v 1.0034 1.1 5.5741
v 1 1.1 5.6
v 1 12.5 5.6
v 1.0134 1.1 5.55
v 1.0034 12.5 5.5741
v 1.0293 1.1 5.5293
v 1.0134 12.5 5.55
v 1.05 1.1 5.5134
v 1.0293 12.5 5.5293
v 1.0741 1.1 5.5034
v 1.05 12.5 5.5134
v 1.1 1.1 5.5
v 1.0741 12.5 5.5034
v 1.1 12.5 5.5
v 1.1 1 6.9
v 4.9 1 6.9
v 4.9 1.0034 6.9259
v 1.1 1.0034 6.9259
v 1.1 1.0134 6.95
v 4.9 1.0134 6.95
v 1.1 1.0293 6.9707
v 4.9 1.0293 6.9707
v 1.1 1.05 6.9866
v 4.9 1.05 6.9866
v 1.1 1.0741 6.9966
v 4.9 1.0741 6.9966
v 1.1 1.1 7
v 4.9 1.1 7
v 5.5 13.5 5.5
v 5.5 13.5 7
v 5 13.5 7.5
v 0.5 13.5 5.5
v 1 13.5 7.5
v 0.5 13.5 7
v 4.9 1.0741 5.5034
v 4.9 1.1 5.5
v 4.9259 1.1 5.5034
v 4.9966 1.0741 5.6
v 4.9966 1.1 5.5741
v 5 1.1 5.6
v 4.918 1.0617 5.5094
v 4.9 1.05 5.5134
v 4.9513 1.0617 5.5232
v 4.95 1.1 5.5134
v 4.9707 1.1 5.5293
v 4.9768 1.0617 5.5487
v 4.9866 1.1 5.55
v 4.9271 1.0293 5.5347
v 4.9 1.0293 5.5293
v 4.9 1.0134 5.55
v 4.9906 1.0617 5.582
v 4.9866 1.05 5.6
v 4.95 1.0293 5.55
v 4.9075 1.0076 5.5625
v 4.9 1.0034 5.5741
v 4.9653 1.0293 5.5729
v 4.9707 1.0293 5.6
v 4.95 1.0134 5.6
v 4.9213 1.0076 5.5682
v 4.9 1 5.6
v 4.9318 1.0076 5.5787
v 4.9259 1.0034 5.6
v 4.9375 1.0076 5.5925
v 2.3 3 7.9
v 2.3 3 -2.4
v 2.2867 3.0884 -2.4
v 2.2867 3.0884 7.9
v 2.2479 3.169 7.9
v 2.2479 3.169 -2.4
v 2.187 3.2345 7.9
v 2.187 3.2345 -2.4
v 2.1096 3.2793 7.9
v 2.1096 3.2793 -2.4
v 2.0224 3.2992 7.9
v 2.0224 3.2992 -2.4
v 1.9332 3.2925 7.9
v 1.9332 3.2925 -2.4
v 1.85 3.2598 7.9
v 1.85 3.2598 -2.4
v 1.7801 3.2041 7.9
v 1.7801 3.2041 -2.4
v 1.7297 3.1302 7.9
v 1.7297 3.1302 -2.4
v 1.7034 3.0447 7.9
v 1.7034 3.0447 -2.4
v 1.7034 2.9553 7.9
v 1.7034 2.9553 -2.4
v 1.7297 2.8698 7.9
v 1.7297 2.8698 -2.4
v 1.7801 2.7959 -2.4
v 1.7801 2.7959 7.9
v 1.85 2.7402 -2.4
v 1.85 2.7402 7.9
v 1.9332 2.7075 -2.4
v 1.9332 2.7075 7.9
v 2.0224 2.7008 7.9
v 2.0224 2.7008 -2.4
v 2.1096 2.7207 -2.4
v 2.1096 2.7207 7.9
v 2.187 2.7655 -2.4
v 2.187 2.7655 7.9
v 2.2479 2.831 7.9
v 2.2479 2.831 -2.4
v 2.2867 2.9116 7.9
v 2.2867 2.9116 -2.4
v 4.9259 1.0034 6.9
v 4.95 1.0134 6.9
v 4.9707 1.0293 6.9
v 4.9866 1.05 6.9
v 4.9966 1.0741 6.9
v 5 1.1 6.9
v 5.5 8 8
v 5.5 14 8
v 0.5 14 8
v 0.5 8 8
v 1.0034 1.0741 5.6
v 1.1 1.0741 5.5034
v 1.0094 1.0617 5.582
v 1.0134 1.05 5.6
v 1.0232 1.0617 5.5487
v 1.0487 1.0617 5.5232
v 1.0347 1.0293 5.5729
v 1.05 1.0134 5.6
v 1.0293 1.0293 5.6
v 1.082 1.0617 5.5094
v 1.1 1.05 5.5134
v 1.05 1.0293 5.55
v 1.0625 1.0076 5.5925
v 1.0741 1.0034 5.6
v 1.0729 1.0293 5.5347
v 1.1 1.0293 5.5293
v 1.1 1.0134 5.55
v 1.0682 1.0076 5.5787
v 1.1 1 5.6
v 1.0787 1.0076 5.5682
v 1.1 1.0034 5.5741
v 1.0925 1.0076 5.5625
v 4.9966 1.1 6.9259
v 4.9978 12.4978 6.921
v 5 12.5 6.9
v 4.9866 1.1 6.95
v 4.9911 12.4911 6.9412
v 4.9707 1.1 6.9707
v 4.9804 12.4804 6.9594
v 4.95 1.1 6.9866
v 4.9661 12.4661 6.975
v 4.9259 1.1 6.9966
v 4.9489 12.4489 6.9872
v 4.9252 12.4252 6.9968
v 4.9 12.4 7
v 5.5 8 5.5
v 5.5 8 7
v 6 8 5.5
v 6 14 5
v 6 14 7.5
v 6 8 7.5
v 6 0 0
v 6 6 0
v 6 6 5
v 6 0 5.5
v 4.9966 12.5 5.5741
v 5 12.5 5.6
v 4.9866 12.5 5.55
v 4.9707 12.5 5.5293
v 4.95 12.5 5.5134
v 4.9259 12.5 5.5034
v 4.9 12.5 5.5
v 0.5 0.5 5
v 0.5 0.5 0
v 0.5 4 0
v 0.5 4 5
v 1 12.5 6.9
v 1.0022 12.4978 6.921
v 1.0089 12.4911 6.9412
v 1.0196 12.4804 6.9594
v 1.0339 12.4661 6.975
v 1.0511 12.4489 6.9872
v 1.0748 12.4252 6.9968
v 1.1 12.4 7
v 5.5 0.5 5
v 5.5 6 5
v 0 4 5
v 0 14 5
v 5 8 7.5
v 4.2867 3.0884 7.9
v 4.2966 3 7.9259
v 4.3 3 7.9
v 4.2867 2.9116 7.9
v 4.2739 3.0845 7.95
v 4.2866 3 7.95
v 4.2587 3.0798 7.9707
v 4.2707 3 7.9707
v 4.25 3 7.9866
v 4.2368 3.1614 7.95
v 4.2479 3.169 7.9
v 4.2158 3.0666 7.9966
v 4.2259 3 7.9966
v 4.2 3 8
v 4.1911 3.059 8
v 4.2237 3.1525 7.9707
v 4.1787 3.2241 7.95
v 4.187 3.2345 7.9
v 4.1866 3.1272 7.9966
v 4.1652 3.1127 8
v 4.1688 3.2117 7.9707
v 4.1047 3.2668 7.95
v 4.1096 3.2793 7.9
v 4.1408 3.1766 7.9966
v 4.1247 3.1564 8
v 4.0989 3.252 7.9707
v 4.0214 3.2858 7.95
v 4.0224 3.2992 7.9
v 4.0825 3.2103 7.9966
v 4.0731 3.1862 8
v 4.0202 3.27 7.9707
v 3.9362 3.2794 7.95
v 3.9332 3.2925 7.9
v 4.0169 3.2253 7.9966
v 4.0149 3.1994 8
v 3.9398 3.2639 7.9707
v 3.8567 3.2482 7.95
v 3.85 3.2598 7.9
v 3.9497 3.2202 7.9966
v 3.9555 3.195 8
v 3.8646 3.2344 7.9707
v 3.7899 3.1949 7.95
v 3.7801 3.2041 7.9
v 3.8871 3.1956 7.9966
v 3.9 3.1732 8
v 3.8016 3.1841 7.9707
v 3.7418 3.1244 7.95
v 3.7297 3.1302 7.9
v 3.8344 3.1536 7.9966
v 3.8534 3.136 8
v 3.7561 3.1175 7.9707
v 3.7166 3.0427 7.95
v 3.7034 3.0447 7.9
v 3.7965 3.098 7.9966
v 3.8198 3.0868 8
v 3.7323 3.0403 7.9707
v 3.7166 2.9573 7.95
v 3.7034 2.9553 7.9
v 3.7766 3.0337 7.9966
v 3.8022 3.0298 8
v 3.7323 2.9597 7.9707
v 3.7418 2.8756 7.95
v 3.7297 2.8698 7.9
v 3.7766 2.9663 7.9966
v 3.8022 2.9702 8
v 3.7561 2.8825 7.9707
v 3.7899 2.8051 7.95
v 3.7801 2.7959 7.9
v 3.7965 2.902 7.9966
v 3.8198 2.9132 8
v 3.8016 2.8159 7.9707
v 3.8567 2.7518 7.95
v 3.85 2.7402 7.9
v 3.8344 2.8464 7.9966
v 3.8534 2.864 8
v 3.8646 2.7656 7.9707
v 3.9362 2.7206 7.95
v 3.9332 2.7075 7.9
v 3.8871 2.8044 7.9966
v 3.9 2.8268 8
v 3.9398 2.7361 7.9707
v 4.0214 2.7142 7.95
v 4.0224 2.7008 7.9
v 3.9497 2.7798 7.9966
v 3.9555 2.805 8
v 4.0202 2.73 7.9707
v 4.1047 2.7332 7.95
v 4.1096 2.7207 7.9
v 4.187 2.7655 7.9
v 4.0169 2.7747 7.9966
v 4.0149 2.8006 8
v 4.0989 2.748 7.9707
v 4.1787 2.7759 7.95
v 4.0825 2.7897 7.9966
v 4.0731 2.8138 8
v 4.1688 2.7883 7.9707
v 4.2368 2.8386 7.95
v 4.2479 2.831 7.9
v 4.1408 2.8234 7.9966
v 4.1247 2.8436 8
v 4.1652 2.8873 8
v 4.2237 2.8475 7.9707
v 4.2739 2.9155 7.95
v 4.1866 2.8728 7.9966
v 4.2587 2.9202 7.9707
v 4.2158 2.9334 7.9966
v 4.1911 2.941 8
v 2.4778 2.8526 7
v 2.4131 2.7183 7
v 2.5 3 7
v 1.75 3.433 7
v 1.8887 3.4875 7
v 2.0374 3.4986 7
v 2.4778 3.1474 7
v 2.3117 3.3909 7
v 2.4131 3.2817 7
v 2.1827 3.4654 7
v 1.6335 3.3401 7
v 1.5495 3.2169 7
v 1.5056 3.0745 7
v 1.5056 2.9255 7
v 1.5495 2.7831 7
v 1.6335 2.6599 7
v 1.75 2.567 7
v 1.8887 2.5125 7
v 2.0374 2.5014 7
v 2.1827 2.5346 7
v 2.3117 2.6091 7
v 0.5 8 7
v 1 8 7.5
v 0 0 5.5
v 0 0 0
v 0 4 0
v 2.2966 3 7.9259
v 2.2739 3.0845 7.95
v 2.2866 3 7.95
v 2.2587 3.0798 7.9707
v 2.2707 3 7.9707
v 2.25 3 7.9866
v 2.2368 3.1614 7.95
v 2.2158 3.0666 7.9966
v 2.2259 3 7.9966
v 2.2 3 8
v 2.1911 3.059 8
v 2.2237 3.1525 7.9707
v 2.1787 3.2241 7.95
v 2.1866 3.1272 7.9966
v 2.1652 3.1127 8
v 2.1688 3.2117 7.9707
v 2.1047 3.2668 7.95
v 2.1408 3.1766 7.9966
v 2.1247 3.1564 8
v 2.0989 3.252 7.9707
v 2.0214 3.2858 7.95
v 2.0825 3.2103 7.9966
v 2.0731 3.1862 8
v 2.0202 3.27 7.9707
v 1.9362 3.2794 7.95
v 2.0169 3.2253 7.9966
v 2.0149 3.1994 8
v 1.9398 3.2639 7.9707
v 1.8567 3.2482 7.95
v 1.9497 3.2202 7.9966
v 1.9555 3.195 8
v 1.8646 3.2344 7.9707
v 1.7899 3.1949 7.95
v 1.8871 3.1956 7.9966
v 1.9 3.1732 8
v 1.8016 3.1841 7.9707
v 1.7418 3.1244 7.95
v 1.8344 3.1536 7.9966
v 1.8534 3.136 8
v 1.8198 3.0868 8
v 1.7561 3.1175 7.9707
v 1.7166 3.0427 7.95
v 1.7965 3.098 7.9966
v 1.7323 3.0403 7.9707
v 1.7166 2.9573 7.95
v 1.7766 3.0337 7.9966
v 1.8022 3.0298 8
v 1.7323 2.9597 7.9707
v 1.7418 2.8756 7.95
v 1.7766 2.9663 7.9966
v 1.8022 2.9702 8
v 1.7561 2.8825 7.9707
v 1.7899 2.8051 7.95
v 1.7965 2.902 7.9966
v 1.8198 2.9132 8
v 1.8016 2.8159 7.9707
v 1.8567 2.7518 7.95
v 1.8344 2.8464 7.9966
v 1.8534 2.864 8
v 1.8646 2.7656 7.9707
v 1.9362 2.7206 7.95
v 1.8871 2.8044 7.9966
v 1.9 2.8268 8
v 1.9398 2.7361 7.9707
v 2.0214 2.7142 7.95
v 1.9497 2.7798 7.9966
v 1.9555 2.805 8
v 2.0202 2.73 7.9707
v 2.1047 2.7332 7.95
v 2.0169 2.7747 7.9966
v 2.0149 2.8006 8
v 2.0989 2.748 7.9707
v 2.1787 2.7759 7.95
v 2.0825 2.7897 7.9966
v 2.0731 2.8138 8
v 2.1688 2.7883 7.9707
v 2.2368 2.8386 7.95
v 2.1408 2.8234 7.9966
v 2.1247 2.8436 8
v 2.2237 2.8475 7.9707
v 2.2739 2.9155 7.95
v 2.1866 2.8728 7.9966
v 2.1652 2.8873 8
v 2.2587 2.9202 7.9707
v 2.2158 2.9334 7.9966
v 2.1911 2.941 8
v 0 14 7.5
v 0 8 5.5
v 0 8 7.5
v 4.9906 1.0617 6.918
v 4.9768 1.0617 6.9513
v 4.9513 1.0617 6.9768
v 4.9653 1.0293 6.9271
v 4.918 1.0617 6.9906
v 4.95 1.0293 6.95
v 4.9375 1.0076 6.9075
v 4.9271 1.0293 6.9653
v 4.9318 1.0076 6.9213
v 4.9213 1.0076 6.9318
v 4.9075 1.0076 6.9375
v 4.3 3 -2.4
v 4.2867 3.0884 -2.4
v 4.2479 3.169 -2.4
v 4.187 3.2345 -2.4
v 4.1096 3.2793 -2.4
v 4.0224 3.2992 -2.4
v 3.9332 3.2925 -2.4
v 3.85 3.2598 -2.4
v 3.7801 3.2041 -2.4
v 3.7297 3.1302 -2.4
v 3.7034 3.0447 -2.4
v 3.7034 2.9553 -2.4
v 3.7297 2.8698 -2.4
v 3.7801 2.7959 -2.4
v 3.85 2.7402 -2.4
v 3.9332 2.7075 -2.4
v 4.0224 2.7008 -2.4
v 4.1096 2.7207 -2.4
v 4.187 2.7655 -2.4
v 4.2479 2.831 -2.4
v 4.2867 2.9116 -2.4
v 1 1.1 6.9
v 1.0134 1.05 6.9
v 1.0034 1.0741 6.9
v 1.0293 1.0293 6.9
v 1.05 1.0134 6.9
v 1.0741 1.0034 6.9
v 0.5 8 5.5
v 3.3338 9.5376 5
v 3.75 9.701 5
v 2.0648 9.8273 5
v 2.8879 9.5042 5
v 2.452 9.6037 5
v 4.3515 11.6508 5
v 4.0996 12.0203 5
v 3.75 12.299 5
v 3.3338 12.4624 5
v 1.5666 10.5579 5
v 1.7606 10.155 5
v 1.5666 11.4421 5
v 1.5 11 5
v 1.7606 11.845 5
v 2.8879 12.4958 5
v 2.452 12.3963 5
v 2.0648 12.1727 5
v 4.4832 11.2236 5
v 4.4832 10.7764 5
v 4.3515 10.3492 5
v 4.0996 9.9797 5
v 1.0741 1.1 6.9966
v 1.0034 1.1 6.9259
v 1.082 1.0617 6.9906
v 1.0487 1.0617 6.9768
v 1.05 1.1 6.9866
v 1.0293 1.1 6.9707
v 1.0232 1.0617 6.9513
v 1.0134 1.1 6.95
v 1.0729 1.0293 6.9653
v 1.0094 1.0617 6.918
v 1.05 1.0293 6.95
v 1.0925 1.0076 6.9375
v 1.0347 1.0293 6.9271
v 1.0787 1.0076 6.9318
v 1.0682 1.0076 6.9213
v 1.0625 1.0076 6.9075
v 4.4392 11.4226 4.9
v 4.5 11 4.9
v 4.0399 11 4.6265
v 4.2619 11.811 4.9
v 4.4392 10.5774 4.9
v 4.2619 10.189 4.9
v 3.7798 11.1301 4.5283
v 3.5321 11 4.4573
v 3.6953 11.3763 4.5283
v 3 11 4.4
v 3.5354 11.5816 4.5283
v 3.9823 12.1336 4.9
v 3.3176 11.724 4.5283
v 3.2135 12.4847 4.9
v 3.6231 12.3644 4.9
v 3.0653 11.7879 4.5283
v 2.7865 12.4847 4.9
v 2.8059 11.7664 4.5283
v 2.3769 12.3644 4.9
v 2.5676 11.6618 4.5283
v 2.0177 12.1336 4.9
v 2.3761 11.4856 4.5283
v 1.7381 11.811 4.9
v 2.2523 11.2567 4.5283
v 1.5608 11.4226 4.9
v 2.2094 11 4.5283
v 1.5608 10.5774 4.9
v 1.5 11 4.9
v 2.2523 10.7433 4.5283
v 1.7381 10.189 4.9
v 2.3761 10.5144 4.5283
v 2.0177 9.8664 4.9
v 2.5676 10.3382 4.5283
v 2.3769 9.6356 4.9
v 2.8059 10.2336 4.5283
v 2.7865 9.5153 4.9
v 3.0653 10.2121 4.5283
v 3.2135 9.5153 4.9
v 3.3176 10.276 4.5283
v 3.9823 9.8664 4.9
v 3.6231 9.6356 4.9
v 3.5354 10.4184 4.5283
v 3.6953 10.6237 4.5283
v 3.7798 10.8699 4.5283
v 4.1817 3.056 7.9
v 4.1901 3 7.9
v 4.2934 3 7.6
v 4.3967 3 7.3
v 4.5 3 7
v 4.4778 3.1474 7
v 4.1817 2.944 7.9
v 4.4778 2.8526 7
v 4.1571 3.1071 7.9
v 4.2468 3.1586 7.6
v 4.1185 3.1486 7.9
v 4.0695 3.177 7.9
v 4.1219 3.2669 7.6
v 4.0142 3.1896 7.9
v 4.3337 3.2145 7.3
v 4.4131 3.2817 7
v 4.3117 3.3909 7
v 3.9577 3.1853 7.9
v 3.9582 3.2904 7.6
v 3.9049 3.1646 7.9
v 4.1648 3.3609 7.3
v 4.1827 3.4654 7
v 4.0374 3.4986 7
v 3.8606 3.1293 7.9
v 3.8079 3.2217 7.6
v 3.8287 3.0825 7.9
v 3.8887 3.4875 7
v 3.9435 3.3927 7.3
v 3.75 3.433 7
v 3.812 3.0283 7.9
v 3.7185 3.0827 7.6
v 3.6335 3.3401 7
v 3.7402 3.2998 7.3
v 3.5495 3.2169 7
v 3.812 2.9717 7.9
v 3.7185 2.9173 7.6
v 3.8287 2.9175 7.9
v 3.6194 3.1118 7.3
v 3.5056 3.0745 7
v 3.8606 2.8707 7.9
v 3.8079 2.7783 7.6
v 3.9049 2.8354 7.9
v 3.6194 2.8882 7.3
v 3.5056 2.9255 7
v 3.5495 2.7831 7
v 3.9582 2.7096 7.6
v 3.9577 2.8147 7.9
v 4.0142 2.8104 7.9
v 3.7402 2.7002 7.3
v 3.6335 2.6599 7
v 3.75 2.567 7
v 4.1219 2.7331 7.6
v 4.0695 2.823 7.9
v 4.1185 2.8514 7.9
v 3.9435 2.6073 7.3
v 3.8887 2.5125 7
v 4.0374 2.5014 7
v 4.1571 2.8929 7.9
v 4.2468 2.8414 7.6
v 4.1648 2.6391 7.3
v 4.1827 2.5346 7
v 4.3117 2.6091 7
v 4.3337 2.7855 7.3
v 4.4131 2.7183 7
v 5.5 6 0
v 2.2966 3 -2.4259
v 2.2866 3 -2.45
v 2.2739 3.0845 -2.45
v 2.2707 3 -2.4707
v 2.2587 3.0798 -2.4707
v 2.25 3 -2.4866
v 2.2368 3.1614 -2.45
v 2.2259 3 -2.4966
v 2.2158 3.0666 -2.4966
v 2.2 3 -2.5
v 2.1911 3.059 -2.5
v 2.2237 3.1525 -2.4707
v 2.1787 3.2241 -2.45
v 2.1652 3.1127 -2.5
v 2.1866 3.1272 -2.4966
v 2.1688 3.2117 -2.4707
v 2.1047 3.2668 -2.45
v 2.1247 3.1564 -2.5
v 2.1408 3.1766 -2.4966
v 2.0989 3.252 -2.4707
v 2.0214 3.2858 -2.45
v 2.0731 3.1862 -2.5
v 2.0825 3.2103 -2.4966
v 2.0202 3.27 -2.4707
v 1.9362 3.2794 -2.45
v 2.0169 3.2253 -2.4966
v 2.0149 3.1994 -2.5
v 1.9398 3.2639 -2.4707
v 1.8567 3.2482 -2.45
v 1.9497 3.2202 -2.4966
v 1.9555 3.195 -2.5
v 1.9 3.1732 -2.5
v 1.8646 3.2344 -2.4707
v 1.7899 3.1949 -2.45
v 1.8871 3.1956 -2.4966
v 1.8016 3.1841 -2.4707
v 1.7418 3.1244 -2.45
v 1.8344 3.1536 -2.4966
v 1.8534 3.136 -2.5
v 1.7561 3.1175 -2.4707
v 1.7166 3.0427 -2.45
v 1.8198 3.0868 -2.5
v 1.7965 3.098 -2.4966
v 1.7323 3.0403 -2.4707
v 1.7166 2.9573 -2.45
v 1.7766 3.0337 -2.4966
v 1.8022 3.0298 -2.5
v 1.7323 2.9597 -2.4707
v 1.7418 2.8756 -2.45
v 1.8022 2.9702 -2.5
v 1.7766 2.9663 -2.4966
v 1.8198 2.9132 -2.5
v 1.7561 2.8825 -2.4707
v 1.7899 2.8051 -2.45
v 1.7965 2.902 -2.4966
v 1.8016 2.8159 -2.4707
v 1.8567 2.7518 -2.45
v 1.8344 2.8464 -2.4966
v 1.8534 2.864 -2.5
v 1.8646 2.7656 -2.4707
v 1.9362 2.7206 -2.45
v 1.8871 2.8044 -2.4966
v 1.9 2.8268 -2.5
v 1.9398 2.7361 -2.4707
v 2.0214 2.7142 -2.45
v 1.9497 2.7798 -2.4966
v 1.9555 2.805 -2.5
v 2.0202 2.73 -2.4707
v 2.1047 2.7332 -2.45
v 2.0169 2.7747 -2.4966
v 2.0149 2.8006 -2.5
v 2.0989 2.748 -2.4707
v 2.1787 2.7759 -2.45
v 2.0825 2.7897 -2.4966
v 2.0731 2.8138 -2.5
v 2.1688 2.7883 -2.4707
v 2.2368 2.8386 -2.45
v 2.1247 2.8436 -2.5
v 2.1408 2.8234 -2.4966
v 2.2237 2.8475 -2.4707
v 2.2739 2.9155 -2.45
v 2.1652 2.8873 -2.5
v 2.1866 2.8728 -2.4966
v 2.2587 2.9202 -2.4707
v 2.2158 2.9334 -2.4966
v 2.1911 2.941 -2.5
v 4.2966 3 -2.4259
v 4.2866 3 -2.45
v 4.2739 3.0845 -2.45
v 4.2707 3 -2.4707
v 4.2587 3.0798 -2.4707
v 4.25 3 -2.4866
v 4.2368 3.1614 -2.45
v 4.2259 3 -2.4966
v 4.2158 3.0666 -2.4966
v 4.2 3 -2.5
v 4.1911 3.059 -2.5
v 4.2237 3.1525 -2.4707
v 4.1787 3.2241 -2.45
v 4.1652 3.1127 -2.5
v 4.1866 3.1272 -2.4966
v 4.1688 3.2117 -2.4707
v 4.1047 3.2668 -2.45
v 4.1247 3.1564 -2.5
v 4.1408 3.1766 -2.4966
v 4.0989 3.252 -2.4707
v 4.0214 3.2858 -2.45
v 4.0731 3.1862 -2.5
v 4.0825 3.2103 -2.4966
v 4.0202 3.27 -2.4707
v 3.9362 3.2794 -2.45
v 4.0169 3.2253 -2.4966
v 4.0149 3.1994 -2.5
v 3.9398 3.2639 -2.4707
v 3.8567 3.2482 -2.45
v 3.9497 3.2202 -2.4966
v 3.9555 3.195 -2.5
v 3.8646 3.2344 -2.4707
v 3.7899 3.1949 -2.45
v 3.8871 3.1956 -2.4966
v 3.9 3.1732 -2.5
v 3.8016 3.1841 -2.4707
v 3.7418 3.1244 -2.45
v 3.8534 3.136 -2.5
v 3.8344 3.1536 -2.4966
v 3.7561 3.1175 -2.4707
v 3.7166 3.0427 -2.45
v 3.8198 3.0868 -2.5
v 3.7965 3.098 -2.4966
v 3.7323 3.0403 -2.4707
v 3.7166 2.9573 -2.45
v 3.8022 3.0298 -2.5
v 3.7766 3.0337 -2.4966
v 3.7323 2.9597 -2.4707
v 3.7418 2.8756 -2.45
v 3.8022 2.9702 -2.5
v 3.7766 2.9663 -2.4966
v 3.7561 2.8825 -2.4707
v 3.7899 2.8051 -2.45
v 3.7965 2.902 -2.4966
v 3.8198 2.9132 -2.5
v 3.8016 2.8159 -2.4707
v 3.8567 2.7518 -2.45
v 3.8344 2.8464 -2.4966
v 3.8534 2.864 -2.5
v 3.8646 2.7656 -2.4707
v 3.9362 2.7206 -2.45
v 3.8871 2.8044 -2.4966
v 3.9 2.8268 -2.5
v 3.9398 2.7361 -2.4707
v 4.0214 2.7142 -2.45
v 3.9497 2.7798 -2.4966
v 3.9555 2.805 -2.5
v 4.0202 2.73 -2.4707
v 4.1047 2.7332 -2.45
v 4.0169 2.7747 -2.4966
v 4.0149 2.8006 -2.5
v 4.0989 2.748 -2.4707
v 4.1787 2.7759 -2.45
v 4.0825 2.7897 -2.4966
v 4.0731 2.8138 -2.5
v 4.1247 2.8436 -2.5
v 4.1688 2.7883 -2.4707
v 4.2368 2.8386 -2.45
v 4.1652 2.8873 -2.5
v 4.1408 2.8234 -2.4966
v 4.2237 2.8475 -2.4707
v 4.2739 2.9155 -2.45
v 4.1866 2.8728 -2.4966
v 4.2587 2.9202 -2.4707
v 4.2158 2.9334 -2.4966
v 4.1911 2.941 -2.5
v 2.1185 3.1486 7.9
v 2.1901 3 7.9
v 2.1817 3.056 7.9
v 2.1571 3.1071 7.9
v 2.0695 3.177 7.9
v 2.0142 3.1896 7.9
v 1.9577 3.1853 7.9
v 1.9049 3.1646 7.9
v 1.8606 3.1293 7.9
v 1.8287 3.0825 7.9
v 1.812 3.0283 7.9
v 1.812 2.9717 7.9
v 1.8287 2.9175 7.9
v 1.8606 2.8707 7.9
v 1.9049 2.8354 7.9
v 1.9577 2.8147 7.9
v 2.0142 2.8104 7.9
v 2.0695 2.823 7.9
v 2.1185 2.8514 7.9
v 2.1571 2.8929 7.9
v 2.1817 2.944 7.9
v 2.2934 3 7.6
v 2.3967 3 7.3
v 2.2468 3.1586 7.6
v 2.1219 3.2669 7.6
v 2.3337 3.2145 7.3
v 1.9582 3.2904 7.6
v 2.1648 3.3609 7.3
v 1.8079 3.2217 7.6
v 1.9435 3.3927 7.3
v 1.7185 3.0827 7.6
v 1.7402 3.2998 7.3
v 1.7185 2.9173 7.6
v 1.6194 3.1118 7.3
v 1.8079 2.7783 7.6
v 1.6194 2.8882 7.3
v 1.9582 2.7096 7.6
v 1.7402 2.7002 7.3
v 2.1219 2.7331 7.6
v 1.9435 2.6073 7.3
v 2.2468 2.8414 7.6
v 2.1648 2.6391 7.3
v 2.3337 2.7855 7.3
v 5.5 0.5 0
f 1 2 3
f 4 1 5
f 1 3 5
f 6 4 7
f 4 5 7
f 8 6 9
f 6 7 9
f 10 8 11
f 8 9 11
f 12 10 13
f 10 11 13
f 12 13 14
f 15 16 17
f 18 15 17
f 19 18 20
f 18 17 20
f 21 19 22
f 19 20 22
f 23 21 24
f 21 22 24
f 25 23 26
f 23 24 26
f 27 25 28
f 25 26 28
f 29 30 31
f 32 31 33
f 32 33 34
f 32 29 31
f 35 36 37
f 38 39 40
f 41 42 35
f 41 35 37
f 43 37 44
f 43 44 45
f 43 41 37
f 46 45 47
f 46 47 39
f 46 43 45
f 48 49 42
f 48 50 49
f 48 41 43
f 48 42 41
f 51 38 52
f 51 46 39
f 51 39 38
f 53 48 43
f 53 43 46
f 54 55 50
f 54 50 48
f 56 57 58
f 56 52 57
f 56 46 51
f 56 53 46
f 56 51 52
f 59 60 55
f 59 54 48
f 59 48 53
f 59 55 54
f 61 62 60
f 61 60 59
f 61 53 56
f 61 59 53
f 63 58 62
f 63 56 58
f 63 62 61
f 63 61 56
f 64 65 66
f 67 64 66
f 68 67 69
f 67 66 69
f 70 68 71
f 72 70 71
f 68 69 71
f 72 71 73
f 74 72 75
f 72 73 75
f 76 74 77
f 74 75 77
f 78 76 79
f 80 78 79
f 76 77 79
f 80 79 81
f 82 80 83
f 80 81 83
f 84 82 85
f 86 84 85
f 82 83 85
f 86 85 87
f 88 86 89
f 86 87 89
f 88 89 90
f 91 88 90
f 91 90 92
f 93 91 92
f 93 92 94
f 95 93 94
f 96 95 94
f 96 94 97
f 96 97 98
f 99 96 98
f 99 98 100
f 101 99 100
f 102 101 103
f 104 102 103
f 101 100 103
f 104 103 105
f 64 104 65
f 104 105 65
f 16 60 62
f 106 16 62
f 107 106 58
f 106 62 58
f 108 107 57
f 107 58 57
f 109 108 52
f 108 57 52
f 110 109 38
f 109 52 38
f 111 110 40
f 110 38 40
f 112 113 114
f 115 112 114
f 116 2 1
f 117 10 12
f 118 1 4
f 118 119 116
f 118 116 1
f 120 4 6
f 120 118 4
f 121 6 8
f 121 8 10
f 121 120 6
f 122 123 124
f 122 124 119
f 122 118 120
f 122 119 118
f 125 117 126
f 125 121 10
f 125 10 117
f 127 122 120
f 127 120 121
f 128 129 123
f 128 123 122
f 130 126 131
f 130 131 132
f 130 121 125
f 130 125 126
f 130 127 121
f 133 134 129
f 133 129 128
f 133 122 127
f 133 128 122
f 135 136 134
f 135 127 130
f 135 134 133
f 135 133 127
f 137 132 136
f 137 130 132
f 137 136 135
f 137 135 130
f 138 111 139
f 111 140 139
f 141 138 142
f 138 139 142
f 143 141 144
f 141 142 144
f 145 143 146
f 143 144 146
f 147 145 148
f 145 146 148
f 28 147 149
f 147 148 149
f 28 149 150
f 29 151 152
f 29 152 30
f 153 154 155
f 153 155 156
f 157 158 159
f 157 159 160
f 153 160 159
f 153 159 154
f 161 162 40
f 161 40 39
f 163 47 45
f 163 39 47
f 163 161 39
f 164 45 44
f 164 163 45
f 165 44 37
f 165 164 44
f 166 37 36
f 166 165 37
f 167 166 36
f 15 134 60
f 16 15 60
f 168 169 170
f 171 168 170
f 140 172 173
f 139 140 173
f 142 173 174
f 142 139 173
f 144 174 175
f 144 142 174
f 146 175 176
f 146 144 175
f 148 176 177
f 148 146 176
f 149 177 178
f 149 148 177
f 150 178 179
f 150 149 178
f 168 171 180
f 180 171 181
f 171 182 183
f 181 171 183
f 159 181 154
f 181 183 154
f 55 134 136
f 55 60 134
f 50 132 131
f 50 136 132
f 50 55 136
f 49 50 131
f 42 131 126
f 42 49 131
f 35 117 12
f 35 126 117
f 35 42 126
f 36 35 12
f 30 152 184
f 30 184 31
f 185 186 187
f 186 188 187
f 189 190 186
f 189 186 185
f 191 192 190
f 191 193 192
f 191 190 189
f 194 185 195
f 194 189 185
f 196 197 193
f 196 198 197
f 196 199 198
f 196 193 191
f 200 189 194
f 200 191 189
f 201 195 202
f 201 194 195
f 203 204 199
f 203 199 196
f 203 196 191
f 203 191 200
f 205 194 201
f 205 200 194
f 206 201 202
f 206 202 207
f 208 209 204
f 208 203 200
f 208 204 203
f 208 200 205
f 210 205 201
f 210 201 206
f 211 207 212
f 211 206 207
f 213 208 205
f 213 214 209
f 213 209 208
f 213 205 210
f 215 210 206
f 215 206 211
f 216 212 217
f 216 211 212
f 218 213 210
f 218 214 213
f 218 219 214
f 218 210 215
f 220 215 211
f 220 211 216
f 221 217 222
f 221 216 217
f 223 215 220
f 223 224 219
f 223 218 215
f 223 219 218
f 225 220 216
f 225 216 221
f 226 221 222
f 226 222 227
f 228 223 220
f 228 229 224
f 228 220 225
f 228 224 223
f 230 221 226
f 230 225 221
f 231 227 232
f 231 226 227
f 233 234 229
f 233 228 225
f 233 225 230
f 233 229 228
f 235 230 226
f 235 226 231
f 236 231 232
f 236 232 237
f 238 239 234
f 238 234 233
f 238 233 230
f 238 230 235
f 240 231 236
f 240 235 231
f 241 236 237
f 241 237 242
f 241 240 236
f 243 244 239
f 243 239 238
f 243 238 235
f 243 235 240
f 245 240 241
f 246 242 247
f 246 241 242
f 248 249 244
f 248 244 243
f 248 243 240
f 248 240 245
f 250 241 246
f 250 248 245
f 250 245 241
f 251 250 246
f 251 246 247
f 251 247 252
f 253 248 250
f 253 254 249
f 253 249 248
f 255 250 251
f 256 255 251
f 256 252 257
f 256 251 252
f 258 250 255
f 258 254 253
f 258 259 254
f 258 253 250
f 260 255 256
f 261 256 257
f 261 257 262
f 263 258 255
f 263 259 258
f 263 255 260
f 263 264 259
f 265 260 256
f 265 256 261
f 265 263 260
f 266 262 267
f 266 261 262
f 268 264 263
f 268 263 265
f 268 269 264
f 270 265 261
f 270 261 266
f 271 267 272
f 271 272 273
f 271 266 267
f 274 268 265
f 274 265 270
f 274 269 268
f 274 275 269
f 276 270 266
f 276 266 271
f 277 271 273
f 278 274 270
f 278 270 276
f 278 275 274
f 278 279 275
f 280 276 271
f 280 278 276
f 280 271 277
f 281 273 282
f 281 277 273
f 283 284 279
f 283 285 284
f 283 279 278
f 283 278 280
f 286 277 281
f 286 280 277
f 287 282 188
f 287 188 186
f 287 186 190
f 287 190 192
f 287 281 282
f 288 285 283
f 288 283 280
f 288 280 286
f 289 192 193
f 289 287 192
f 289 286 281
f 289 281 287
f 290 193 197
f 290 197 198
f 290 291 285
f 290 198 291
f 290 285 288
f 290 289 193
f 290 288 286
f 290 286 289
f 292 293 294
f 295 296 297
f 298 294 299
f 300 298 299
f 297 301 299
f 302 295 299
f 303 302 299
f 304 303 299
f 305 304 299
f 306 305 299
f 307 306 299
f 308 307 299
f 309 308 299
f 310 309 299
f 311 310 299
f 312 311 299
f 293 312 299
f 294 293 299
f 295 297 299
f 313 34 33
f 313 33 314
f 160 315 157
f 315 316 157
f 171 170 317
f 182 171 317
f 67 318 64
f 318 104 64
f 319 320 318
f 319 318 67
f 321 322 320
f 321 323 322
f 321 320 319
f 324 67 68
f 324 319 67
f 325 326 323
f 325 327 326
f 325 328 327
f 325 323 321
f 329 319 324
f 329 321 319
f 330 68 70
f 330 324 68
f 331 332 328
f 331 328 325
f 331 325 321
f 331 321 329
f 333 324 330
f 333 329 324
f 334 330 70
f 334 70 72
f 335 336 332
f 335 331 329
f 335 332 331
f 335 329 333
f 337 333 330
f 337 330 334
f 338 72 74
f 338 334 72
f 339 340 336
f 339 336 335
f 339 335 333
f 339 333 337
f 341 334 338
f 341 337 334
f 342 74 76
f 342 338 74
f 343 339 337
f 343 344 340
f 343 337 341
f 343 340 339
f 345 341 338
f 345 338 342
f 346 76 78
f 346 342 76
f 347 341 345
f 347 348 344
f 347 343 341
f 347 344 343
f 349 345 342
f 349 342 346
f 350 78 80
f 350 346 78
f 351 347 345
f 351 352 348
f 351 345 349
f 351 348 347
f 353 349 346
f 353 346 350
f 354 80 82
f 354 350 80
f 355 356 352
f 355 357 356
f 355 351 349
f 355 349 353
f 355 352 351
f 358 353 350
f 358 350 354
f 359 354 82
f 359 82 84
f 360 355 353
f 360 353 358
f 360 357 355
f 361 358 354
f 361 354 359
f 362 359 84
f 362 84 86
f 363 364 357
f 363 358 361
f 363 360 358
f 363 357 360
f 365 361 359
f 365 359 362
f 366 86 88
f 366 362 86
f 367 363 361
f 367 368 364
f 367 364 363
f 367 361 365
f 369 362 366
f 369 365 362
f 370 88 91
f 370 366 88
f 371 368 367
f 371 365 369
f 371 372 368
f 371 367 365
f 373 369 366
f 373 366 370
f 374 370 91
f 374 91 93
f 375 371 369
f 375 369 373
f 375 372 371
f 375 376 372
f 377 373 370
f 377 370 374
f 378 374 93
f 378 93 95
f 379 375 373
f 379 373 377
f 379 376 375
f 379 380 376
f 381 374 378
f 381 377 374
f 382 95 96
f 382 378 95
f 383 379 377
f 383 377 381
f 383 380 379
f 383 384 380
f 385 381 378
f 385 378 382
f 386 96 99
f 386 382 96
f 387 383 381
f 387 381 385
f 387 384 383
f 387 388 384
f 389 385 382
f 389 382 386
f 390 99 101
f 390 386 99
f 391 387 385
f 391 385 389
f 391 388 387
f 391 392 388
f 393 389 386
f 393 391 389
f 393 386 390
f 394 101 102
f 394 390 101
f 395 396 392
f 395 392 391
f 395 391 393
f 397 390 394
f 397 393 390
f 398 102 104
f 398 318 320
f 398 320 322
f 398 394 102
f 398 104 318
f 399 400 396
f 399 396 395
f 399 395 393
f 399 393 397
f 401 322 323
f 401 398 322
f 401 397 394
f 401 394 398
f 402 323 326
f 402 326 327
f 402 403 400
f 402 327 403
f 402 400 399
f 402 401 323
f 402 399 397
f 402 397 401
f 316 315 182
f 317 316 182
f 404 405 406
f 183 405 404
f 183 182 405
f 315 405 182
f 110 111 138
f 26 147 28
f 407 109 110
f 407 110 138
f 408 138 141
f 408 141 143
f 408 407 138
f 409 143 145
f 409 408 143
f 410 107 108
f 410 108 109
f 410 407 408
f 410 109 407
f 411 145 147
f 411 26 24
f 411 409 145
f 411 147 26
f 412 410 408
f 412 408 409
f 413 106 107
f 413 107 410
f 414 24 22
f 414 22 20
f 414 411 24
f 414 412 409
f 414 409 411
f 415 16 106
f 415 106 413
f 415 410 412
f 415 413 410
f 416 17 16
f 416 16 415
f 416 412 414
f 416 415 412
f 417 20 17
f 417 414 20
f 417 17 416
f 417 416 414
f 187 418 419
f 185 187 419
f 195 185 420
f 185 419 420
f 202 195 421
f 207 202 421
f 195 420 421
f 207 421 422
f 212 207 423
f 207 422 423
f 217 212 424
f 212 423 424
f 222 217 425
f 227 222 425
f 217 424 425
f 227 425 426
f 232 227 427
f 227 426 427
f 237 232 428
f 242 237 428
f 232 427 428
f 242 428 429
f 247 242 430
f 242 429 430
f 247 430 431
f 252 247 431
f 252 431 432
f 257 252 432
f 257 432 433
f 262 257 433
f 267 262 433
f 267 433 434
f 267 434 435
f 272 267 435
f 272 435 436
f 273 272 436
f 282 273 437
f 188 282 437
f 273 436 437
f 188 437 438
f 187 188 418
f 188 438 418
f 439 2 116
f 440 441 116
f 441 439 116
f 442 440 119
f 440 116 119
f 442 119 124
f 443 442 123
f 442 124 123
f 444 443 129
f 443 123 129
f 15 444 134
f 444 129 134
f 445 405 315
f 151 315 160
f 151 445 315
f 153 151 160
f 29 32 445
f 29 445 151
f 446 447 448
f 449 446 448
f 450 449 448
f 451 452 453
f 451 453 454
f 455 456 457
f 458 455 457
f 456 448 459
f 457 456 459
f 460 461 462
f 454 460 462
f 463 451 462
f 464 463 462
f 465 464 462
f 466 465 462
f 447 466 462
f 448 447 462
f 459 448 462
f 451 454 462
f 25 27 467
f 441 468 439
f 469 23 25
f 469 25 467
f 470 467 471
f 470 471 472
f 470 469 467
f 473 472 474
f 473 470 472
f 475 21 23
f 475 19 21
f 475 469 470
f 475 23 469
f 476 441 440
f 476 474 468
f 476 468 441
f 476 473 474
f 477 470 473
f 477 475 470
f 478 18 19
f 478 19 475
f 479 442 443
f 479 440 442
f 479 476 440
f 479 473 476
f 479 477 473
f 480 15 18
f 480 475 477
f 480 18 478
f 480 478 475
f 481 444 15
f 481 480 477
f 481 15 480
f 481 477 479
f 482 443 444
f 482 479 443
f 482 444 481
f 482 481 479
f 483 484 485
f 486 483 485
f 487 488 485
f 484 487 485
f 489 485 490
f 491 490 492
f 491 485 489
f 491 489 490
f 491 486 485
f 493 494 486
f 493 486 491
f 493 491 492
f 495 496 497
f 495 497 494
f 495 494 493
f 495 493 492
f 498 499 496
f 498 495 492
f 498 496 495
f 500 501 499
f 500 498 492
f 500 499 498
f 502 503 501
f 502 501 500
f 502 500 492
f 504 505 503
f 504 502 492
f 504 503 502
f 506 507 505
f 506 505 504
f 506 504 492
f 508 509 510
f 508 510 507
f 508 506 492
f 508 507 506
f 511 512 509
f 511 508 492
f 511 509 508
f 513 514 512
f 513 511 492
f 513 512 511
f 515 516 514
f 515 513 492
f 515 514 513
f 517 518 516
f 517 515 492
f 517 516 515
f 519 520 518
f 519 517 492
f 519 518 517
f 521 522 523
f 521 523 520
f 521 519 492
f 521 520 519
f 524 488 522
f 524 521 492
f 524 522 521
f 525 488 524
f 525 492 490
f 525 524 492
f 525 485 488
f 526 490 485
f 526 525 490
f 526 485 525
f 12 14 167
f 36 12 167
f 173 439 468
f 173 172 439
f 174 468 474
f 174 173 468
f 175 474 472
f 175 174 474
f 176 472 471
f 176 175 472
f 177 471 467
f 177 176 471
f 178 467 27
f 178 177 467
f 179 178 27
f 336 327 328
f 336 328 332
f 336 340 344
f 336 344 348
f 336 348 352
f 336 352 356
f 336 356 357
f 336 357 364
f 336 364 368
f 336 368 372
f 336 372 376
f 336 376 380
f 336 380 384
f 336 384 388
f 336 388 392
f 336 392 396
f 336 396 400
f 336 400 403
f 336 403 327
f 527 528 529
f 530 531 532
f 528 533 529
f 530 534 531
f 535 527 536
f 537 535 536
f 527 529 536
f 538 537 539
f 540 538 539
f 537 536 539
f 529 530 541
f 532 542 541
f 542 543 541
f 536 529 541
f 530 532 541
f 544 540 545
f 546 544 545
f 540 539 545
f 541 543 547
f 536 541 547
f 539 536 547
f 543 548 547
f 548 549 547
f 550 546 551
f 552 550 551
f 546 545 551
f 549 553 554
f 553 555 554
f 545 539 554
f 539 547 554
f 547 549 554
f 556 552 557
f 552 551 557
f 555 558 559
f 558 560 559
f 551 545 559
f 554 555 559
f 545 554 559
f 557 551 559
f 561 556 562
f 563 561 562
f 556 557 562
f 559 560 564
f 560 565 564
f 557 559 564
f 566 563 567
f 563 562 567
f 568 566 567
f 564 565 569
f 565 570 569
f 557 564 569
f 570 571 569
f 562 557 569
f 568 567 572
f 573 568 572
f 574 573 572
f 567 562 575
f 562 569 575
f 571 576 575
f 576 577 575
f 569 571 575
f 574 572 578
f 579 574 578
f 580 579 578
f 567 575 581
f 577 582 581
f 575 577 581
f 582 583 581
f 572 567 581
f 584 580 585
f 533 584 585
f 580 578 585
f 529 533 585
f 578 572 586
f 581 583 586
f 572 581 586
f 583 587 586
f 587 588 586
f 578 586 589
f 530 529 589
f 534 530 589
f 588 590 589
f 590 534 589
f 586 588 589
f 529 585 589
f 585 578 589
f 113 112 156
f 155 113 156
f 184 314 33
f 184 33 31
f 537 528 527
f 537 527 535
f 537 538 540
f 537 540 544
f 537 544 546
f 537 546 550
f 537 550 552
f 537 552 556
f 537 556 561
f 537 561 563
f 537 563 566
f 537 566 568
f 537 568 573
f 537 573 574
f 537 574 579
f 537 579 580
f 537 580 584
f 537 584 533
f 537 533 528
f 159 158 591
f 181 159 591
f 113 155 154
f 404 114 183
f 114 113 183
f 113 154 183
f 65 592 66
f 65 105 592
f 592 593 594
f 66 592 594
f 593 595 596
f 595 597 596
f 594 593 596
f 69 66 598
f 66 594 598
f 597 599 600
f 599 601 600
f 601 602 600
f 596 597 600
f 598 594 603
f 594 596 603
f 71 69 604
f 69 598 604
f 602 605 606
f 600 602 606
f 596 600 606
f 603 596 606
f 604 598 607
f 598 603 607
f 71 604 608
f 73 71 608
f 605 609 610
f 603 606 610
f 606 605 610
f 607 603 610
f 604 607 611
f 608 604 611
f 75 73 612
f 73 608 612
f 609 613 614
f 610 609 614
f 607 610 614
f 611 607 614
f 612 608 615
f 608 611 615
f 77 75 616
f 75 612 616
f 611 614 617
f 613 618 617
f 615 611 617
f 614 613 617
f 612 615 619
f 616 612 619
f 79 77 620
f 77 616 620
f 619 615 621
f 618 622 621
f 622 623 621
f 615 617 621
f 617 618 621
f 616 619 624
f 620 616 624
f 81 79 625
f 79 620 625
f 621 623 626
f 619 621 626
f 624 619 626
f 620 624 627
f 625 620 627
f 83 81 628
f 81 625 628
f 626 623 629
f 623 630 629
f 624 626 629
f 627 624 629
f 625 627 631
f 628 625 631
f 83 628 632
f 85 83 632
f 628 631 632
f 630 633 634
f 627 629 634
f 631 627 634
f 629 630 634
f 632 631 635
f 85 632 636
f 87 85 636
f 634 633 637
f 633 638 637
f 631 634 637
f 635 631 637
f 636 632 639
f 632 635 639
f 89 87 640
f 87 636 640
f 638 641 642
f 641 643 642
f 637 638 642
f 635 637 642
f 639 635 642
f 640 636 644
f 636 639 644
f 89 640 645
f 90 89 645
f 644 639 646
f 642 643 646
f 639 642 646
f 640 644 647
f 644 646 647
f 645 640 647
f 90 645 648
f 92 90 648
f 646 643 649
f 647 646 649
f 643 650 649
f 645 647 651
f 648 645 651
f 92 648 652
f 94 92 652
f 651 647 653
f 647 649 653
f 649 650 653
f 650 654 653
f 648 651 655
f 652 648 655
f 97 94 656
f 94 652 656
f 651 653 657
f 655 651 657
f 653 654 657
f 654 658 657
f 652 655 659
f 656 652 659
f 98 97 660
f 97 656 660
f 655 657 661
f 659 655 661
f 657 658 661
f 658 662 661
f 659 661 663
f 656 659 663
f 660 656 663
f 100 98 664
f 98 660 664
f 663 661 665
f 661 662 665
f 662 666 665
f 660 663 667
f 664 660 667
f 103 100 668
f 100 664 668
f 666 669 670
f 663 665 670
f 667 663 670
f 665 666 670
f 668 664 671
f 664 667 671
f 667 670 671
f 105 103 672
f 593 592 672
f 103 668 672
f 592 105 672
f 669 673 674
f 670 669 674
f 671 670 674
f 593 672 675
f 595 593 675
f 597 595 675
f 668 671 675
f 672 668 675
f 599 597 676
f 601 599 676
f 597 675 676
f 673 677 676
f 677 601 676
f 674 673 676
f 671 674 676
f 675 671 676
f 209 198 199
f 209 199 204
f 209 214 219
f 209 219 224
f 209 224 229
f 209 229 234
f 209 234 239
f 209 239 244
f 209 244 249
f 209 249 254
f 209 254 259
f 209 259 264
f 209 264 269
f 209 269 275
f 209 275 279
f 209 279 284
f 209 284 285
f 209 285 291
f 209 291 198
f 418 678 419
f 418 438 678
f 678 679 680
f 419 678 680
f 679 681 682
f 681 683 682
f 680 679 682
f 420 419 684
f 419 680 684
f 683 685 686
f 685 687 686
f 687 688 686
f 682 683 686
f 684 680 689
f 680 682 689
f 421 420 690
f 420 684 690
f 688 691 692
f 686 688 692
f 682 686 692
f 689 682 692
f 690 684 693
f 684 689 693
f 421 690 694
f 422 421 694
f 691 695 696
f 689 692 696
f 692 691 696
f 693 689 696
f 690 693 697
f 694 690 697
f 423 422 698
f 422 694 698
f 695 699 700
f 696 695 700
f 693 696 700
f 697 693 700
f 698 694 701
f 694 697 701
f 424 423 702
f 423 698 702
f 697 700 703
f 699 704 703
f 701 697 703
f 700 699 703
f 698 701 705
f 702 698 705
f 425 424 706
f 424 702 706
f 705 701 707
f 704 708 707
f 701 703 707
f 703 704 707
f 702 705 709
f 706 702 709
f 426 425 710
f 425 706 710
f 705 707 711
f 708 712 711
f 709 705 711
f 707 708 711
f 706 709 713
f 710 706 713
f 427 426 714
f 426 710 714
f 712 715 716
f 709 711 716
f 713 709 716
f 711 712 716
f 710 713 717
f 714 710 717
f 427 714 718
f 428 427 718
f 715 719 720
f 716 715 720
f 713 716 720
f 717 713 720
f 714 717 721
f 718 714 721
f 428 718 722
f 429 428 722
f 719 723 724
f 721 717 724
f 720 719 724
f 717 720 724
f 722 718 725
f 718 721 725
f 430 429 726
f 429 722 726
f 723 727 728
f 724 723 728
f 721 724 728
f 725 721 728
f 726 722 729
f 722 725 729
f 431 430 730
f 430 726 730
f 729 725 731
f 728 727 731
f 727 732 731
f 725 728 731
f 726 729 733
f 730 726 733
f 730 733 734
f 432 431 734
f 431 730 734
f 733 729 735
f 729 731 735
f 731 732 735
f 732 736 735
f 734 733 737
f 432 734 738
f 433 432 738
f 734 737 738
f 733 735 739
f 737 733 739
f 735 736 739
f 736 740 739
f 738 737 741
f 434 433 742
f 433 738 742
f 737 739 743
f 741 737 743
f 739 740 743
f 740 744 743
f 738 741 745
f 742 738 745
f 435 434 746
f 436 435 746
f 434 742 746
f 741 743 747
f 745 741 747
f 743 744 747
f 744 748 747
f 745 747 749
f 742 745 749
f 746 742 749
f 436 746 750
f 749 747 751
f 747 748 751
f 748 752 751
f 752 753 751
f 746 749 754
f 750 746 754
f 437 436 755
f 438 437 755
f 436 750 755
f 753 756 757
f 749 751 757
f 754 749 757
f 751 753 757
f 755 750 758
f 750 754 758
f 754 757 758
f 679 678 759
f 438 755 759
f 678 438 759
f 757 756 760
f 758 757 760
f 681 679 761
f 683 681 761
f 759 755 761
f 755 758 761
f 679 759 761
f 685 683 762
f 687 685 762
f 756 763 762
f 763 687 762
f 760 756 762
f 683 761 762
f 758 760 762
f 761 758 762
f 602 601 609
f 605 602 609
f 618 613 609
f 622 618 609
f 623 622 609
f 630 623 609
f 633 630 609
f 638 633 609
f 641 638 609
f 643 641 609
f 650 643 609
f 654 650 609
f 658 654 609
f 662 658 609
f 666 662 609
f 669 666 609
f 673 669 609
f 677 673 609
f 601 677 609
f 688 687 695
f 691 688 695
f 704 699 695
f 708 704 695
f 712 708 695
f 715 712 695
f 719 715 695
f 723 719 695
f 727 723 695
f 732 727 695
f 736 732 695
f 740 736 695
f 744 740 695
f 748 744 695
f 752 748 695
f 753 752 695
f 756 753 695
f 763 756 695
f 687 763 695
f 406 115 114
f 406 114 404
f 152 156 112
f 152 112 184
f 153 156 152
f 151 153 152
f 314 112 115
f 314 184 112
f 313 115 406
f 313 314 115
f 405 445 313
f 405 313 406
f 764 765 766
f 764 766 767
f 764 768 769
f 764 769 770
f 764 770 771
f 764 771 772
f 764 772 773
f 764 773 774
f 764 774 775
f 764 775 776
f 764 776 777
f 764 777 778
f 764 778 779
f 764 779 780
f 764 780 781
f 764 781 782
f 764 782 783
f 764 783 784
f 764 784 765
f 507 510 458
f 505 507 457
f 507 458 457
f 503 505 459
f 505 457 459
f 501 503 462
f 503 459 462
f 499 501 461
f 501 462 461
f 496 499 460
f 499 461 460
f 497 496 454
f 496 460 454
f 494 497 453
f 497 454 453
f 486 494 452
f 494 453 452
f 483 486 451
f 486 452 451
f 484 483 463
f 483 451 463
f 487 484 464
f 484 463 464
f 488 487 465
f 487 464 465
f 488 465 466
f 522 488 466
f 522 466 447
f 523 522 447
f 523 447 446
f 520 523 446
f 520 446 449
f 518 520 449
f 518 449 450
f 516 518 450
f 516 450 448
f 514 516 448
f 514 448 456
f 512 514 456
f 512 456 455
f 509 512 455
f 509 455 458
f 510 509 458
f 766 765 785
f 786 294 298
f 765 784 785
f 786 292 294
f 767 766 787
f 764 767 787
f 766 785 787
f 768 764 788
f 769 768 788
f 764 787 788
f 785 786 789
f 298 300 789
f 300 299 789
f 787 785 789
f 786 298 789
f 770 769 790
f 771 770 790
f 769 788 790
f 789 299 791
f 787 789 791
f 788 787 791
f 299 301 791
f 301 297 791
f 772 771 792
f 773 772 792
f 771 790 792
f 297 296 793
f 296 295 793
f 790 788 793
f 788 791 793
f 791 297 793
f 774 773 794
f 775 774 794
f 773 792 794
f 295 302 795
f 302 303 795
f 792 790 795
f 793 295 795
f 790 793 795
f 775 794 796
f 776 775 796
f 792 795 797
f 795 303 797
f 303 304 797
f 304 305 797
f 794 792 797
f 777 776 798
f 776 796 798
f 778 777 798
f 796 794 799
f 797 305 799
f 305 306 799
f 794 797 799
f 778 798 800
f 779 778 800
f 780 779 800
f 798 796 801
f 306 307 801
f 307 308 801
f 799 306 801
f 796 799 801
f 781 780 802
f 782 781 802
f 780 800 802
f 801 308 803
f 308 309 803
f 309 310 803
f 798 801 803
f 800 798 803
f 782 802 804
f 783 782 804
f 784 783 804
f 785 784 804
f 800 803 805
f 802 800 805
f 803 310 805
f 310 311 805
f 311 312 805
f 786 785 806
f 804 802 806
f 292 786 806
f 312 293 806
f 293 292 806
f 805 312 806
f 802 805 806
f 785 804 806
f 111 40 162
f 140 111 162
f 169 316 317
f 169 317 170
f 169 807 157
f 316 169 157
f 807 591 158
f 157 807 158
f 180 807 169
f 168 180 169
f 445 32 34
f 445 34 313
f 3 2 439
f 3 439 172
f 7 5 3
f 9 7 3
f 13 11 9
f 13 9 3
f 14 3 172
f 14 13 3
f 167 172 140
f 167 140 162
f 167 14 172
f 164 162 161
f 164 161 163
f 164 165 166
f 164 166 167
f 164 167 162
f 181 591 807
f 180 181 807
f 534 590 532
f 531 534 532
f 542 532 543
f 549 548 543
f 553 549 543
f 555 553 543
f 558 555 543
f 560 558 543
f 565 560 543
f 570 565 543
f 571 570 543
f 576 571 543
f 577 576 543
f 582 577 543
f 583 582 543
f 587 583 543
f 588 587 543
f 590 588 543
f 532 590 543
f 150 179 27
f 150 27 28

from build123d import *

# Parameters (mm, degrees)
BOSS_EXTRUDE1_DEPTH           = 5
BOSS_EXTRUDE2_DEPTH           = 0.5
BOSS_EXTRUDE3_DEPTH           = 2
BOSS_EXTRUDE4_REACH           = 14.5
BOSS_EXTRUDE5_DEPTH           = 6
SKETCH10_W                    = 4
SKETCH10_H                    = 11.5
BOSS_EXTRUDE6_DEPTH           = 1.5
FILLET1_R                     = 0.1
CHAMFER1_SIZE                 = 0.5
SKETCH11_R                    = 1.5
BOSS_EXTRUDE7_DEPTH           = 0.1
FILLET2_R                     = 0.1
BOSS_EXTRUDE8_DEPTH           = 1
BOSS_EXTRUDE8_DEPTH_BACK      = 9.5
SKETCH12_R                    = 0.3
BOSS_EXTRUDE8_2_DEPTH         = 1
BOSS_EXTRUDE8_2_DEPTH_BACK    = 9.5
FILLET4_R                     = 0.1
FILLET5_R                     = 0.1
SKETCH13_R                    = 0.5
BOSS_EXTRUDE9_DEPTH           = 0.9
BOSS_EXTRUDE9_DRAFT           = 19
BOSS_EXTRUDE9_PROFILE_2_DEPTH = 0.9
BOSS_EXTRUDE9_PROFILE_2_DRAFT = 19


# Read off the part's stored shape, not the designer's step: Dome1
with BuildPart() as part:
    # Sketch1 → Boss-Extrude1 (new body)
    with BuildSketch(Plane.XY):
        Polygon((0.5, 0.5), (0.5, 4), (0, 4), (0, 0), (6, 0), (6, 6), (5.5, 6), (5.5, 0.5), align=None)
    extrude(amount=BOSS_EXTRUDE1_DEPTH)

    # Sketch2 → Boss-Extrude2 (add)
    with BuildSketch(Plane.XY.offset(5)):
        Polygon((6, 6), (6, 14), (0, 14), (0, 4), (0, 0), (6, 0), align=None)
    extrude(amount=BOSS_EXTRUDE2_DEPTH)

    # Sketch3 → Boss-Extrude3 (add)
    with BuildSketch(Plane.XY.offset(5.5)):
        Polygon((0, 14), (6, 14), (6, 8), (5.5, 8), (5.5, 13.5), (0.5, 13.5), (0.5, 8), (0, 8), align=None)
    extrude(amount=BOSS_EXTRUDE3_DEPTH)

    # Boss-Extrude4: up to this face of the body (flat: up to its plane)
    boss_extrude4_end = Plane(part.part.faces().sort_by_distance((3, 14, 6.25))[0])
    # Sketch8 → Boss-Extrude4 (add, up to the picked face)
    with BuildSketch(Plane(origin=(0, 8, 0), x_dir=(-1, 0, 0), z_dir=(0, -1, 0)), mode=Mode.PRIVATE) as boss_extrude4_sk1:
        Polygon((-0.5, -7.5), (-1, -8), (-0.5, -8), (0, -7.5), align=None)
    boss_extrude4_tool1 = split(extrude(boss_extrude4_sk1.sketch, amount=-BOSS_EXTRUDE4_REACH, mode=Mode.PRIVATE), bisect_by=boss_extrude4_end, keep=Keep.BOTH, mode=Mode.PRIVATE)
    # Sketch8 → Boss-Extrude4 (add, up to the picked face)
    with BuildSketch(Plane(origin=(0, 8, 0), x_dir=(-1, 0, 0), z_dir=(0, -1, 0)), mode=Mode.PRIVATE) as boss_extrude4_sk2:
        Polygon((-6, -7.5), (-5.5, -7.5), (-5, -8), (-5.5, -8), align=None)
    boss_extrude4_tool2 = split(extrude(boss_extrude4_sk2.sketch, amount=-BOSS_EXTRUDE4_REACH, mode=Mode.PRIVATE), bisect_by=boss_extrude4_end, keep=Keep.BOTH, mode=Mode.PRIVATE)
    add(boss_extrude4_tool1.solids().sort_by(Axis((0.5, 8, 7.75), (0, 1, 0)))[0])
    add(boss_extrude4_tool2.solids().sort_by(Axis((5.5, 8, 7.75), (0, 1, 0)))[0])

    # Sketch9 → Boss-Extrude5 (add)
    with BuildSketch(Plane(origin=(0, 14, 0), x_dir=(1, 0, 0), z_dir=(0, 1, 0))):
        Polygon((0.5, -7.5), (5.5, -7.5), (5, -8), (1, -8), align=None)
    extrude(amount=-BOSS_EXTRUDE5_DEPTH)

    # Chamfer1
    chamfer1_edges = [part.edges().sort_by_distance(p)[0] for p in [
        (0.5, 10.75, 7.5),
        (5.5, 10.75, 7.5),
    ]]
    chamfer(chamfer1_edges, length=CHAMFER1_SIZE)


with BuildPart() as body_2:
    # Sketch10 → Boss-Extrude6 (new body)
    with BuildSketch(Plane.XY.offset(5.5)):
        with Locations((3, 6.75)):
            Rectangle(SKETCH10_W, SKETCH10_H)
    extrude(amount=BOSS_EXTRUDE6_DEPTH)

    # Fillet1
    fillet1_edges = [body_2.edges().sort_by_distance(p)[0] for p in [
        (5, 6.75, 7),
        (3, 12.5, 7),
        (1, 6.75, 7),
        (5, 6.75, 5.5),
        (3, 1, 5.5),
        (1, 6.75, 5.5),
        (3, 1, 7),
    ]]
    fillet(fillet1_edges, radius=FILLET1_R)

    # Fillet2
    # the kernel refuses this fillet: 0.1 mm, written as the material it takes off along each edge
    with BuildSketch(Plane(origin=(4.9, 1.1, 6.9), x_dir=(1, 0, 0), z_dir=(0, -1, 0))) as fillet2_piece_1_section:
        Polygon((0, 0), (FILLET2_R, 0), (FILLET2_R, FILLET2_R), (0, FILLET2_R), align=None)
    fillet2_piece_1 = extrude(amount=FILLET2_R, mode=Mode.PRIVATE)
    fillet2_piece_1 = fillet2_piece_1 - Plane(origin=(4.9, 1.1, 6.9), x_dir=(-0.7071067811865475, 0, -0.7071067811865475), z_dir=(0, -1, 0)) * Sphere(FILLET2_R, mode=Mode.PRIVATE)
    add(fillet2_piece_1, mode=Mode.SUBTRACT)
    with BuildSketch(Plane(origin=(1.1, 1.1, 6.9), x_dir=(-1, 0, 0), z_dir=(0, -1, 0))) as fillet2_piece_2_section:
        Polygon((0, 0), (FILLET2_R, 0), (FILLET2_R, -FILLET2_R), (0, -FILLET2_R), align=None)
    fillet2_piece_2 = extrude(amount=FILLET2_R, mode=Mode.PRIVATE)
    fillet2_piece_2 = fillet2_piece_2 - Plane(origin=(1.1, 1.1, 6.9), x_dir=(0.7071067811865475, 0, -0.7071067811865475), z_dir=(0, -1, 0)) * Sphere(FILLET2_R, mode=Mode.PRIVATE)
    add(fillet2_piece_2, mode=Mode.SUBTRACT)
    with BuildSketch(Plane(origin=(1.1, 1.1, 5.6), x_dir=(-1, 0, 0), z_dir=(0, -1, 0))) as fillet2_piece_3_section:
        Polygon((0, 0), (FILLET2_R, 0), (FILLET2_R, FILLET2_R), (0, FILLET2_R), align=None)
    fillet2_piece_3 = extrude(amount=FILLET2_R, mode=Mode.PRIVATE)
    fillet2_piece_3 = fillet2_piece_3 - Plane(origin=(1.1, 1.1, 5.6), x_dir=(0.7071067811865475, 0, 0.7071067811865475), z_dir=(0, -1, 0)) * Sphere(FILLET2_R, mode=Mode.PRIVATE)
    add(fillet2_piece_3, mode=Mode.SUBTRACT)
    with BuildSketch(Plane(origin=(4.9, 1.1, 5.6), x_dir=(1, 0, 0), z_dir=(0, -1, 0))) as fillet2_piece_4_section:
        Polygon((0, 0), (FILLET2_R, 0), (FILLET2_R, -FILLET2_R), (0, -FILLET2_R), align=None)
    fillet2_piece_4 = extrude(amount=FILLET2_R, mode=Mode.PRIVATE)
    fillet2_piece_4 = fillet2_piece_4 - Plane(origin=(4.9, 1.1, 5.6), x_dir=(-0.7071067811865475, 0, 0.7071067811865475), z_dir=(0, -1, 0)) * Sphere(FILLET2_R, mode=Mode.PRIVATE)
    add(fillet2_piece_4, mode=Mode.SUBTRACT)
    with BuildSketch(Plane(origin=(5, 1, 5.6), x_dir=(-1, 0, 0), z_dir=(0, 0, 1))) as fillet2_piece_5:
        with BuildLine():
            CenterArc((FILLET2_R, -FILLET2_R), FILLET2_R, 90, 90)
            Line((0, -FILLET2_R), (0, 0))
            Line((0, 0), (FILLET2_R, 0))
        make_face()
    extrude(amount=1.3, mode=Mode.SUBTRACT)
    with BuildSketch(Plane(origin=(1, 1, 5.6), x_dir=(1, 0, 0), z_dir=(0, 0, 1))) as fillet2_piece_6:
        with BuildLine():
            CenterArc((FILLET2_R, FILLET2_R), FILLET2_R, 180, 90)
            Line((0, FILLET2_R), (0, 0))
            Line((0, 0), (FILLET2_R, 0))
        make_face()
    extrude(amount=1.3, mode=Mode.SUBTRACT)


with BuildPart() as body_3:
    # Sketch11 → Boss-Extrude7 (new body)
    with BuildSketch(Plane(origin=(0, 0, 5), x_dir=(-1, 0, 0), z_dir=(0, 0, -1))):
        with Locations((-3, 11)):
            Circle(SKETCH11_R)
    extrude(amount=BOSS_EXTRUDE7_DEPTH)

    # Dome1 outline → Dome1 (revolve)
    with BuildSketch(Plane(origin=(3, 11, 0), x_dir=(1, 0, 0), z_dir=(0, -1, 0))):
        with BuildLine():
            Line((0, 4.900000002), (0, 4.4))
            ThreePointArc((0, 4.4), (0.790569416, 4.528291755), (1.500000002, 4.900000002))
            Line((1.500000002, 4.900000002), (0, 4.900000002))
        make_face()
    revolve(axis=Axis((3, 11, 0), (0, 0, 1)))


with BuildPart() as body_4:
    # Sketch12 → Boss-Extrude8 (new, two sides: drawn at the far end of the back side and taken through both)
    with BuildSketch(Plane.XY.offset(7).offset(-BOSS_EXTRUDE8_DEPTH_BACK)):
        with Locations((2, 3)):
            Circle(SKETCH12_R)
    extrude(amount=BOSS_EXTRUDE8_DEPTH + BOSS_EXTRUDE8_DEPTH_BACK)

    # Fillet5
    fillet5_edges = [body_4.edges().sort_by_distance(p)[0] for p in [
        (1.7, 3, -2.5),
        (1.7, 3, 8),
    ]]
    fillet(fillet5_edges, radius=FILLET5_R)


with BuildPart() as body_5:
    # Sketch12 → Boss-Extrude8 2 (new, two sides: drawn at the far end of the back side and taken through both)
    with BuildSketch(Plane.XY.offset(7).offset(-BOSS_EXTRUDE8_2_DEPTH_BACK)):
        with Locations((4, 3)):
            Circle(SKETCH12_R)
    extrude(amount=BOSS_EXTRUDE8_2_DEPTH + BOSS_EXTRUDE8_2_DEPTH_BACK)

    # Fillet4
    fillet4_edges = [body_5.edges().sort_by_distance(p)[0] for p in [
        (3.7, 3, -2.5),
        (3.7, 3, 8),
    ]]
    fillet(fillet4_edges, radius=FILLET4_R)


with BuildPart() as body_6:
    # Sketch13 → Boss-Extrude9 (with draft: the straight prism first)
    with BuildSketch(Plane.XY.offset(7)):
        with Locations((2, 3)):
            Circle(SKETCH13_R)
    extrude(amount=BOSS_EXTRUDE9_DEPTH)
    # Boss-Extrude9: the draft: its side faces are tilted about the plane it starts from
    boss_extrude9_sides = [body_6.faces().sort_by_distance(p)[0] for p in [
        (1.5, 3, 7.45),
    ]]
    draft(boss_extrude9_sides, Plane.XY.offset(7), BOSS_EXTRUDE9_DRAFT)


with BuildPart() as body_7:
    # Sketch13 → Boss-Extrude9 profile 2 (with draft: the straight prism first)
    with BuildSketch(Plane.XY.offset(7)):
        with Locations((4, 3)):
            Circle(SKETCH13_R)
    extrude(amount=BOSS_EXTRUDE9_PROFILE_2_DEPTH)
    # Boss-Extrude9 profile 2: the draft: its side faces are tilted about the plane it starts from
    boss_extrude9_profile_2_sides = [body_7.faces().sort_by_distance(p)[0] for p in [
        (3.5, 3, 7.45),
    ]]
    draft(boss_extrude9_profile_2_sides, Plane.XY.offset(7), BOSS_EXTRUDE9_PROFILE_2_DRAFT)


solid = Compound([part.part, body_2.part, body_3.part, body_4.part, body_5.part, body_6.part, body_7.part])
